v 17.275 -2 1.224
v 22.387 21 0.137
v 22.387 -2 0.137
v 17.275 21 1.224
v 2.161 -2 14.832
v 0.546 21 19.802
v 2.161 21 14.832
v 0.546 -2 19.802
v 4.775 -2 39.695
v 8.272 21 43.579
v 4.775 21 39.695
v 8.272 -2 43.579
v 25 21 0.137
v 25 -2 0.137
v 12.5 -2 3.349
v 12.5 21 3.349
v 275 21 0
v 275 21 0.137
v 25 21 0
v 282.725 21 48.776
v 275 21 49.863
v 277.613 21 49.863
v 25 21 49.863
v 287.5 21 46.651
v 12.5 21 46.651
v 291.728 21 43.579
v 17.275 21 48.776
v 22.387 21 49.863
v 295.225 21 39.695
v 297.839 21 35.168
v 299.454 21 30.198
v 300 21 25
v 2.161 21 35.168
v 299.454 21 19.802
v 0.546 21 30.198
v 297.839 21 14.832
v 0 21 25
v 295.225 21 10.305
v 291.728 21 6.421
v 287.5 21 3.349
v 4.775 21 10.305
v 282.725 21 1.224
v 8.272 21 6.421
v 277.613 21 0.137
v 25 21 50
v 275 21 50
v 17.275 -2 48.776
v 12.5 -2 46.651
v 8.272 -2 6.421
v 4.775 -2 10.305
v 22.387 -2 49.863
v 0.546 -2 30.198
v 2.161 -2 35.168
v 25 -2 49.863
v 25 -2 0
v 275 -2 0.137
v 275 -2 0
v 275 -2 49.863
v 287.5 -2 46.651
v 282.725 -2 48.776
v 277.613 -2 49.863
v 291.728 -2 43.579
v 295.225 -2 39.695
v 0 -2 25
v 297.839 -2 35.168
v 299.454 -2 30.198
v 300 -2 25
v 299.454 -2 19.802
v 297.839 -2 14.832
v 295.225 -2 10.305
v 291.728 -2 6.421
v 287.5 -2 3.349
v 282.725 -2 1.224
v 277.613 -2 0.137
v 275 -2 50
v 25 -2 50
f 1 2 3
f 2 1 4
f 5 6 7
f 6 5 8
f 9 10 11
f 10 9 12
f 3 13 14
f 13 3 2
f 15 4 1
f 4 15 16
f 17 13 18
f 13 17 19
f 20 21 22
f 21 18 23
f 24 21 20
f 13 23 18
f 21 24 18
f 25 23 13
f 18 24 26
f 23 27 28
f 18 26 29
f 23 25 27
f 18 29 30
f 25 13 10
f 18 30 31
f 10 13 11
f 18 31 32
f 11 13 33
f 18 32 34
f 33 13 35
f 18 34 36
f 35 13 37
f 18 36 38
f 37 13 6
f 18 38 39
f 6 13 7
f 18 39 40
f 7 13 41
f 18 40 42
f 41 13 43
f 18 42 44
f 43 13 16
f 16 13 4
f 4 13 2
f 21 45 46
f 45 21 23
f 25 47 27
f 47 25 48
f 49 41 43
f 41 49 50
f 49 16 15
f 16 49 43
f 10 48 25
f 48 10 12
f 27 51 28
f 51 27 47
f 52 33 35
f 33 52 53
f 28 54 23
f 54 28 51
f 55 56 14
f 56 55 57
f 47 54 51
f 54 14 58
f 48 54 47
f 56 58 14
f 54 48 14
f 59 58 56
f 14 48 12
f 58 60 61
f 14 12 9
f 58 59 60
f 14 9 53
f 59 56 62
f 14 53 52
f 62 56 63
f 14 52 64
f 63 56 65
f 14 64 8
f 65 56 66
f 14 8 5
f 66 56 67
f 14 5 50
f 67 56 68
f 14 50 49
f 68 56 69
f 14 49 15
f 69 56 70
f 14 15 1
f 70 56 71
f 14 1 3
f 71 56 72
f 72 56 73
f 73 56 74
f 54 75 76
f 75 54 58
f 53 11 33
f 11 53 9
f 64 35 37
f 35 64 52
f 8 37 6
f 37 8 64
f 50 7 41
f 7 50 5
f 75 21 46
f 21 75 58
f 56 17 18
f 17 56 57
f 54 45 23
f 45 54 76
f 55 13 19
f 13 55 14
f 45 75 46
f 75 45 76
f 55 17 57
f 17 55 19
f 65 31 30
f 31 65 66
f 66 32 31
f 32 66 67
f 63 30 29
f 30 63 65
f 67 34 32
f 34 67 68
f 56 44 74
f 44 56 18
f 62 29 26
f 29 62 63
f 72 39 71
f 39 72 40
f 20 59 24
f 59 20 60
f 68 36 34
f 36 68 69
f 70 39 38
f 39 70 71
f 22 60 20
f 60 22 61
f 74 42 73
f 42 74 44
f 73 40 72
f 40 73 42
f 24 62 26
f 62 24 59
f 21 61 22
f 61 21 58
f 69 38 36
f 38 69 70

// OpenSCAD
/*

    Removal Side Holes
    
    By Anton Augustsson


*/


module removalSideHoles (
    thickness,
    length,
    x,y,z
    ){
/*
    ---------- Local varibles ---------- 
*/

r = 25;
h = thickness+1;
lengthRectangle = length-r*2;


/*
    ---------- Code ---------- 
*/

translate([
    x,
    y+h-1,
    z]) 
rotate([90,0,0])
union () {

translate([
    r,
    r,
    -1
    ])  
cylinder(
    h=h+2,
    r=r
    );

translate([
    r,
    0,
    -1
    ])
cube(size = [
    lengthRectangle,
    r*2,
    h+2
    ]);

translate([
    length-r,
    r,
    -1
    ])  
cylinder(
    h=h+2,
    r=r
    );


}}
    
/*
    ---------- Example ---------- 
*/


standardSheathingWidth = 1220; 
standardSheathingLength = 2440;

mdfTopThickness = 19;
plywoodTopThickness = 12;

// Side protection for ply and mdf
edgeTopThickness = 20; 
edgeTopWidth = 167;
edgeTopLengthX = standardSheathingLength
    +2*edgeTopThickness;
edgeTopLengthY = standardSheathingWidth
    +2*edgeTopThickness;

// 4 list betweend mdf and ply (Pine)
listTopThickness = 20; 
listTopWidth = 80;
listTopLengthX = standardSheathingLength/4
    -listTopThickness;
listTopLengthY = standardSheathingWidth;

// 6 legs (Pine)
legLength = 900
    -plywoodTopThickness
    -mdfTopThickness
    -listTopWidth;
legWidth = 69;
legThickness = 42;

// 3 bottom list (Pine)
listBottomThickness = 20; 
listBottomWidth1 = 60;
listBottomWidth2 = listBottomWidth1
    -plywoodTopThickness;
listBottomLengthX = standardSheathingLength;
listBottomLengthY = standardSheathingWidth;
listBottomLengthY2 = standardSheathingWidth
    +listBottomThickness*2;
bottomHeight = 100;

storageUnitLength=standardSheathingLength/2
    -legThickness*3/2;
storageUnitWidth=400;  
storageUnitHeight=(900-edgeTopWidth)
    -(bottomHeight+listBottomWidth2);
storageUnitThickness=12;


thickness = edgeTopThickness;
length = 300;

x=0;
y=0;
z=0;
yRotate=0;

removalSideHoles (
    thickness,
    length,
    x,y,z
    );
